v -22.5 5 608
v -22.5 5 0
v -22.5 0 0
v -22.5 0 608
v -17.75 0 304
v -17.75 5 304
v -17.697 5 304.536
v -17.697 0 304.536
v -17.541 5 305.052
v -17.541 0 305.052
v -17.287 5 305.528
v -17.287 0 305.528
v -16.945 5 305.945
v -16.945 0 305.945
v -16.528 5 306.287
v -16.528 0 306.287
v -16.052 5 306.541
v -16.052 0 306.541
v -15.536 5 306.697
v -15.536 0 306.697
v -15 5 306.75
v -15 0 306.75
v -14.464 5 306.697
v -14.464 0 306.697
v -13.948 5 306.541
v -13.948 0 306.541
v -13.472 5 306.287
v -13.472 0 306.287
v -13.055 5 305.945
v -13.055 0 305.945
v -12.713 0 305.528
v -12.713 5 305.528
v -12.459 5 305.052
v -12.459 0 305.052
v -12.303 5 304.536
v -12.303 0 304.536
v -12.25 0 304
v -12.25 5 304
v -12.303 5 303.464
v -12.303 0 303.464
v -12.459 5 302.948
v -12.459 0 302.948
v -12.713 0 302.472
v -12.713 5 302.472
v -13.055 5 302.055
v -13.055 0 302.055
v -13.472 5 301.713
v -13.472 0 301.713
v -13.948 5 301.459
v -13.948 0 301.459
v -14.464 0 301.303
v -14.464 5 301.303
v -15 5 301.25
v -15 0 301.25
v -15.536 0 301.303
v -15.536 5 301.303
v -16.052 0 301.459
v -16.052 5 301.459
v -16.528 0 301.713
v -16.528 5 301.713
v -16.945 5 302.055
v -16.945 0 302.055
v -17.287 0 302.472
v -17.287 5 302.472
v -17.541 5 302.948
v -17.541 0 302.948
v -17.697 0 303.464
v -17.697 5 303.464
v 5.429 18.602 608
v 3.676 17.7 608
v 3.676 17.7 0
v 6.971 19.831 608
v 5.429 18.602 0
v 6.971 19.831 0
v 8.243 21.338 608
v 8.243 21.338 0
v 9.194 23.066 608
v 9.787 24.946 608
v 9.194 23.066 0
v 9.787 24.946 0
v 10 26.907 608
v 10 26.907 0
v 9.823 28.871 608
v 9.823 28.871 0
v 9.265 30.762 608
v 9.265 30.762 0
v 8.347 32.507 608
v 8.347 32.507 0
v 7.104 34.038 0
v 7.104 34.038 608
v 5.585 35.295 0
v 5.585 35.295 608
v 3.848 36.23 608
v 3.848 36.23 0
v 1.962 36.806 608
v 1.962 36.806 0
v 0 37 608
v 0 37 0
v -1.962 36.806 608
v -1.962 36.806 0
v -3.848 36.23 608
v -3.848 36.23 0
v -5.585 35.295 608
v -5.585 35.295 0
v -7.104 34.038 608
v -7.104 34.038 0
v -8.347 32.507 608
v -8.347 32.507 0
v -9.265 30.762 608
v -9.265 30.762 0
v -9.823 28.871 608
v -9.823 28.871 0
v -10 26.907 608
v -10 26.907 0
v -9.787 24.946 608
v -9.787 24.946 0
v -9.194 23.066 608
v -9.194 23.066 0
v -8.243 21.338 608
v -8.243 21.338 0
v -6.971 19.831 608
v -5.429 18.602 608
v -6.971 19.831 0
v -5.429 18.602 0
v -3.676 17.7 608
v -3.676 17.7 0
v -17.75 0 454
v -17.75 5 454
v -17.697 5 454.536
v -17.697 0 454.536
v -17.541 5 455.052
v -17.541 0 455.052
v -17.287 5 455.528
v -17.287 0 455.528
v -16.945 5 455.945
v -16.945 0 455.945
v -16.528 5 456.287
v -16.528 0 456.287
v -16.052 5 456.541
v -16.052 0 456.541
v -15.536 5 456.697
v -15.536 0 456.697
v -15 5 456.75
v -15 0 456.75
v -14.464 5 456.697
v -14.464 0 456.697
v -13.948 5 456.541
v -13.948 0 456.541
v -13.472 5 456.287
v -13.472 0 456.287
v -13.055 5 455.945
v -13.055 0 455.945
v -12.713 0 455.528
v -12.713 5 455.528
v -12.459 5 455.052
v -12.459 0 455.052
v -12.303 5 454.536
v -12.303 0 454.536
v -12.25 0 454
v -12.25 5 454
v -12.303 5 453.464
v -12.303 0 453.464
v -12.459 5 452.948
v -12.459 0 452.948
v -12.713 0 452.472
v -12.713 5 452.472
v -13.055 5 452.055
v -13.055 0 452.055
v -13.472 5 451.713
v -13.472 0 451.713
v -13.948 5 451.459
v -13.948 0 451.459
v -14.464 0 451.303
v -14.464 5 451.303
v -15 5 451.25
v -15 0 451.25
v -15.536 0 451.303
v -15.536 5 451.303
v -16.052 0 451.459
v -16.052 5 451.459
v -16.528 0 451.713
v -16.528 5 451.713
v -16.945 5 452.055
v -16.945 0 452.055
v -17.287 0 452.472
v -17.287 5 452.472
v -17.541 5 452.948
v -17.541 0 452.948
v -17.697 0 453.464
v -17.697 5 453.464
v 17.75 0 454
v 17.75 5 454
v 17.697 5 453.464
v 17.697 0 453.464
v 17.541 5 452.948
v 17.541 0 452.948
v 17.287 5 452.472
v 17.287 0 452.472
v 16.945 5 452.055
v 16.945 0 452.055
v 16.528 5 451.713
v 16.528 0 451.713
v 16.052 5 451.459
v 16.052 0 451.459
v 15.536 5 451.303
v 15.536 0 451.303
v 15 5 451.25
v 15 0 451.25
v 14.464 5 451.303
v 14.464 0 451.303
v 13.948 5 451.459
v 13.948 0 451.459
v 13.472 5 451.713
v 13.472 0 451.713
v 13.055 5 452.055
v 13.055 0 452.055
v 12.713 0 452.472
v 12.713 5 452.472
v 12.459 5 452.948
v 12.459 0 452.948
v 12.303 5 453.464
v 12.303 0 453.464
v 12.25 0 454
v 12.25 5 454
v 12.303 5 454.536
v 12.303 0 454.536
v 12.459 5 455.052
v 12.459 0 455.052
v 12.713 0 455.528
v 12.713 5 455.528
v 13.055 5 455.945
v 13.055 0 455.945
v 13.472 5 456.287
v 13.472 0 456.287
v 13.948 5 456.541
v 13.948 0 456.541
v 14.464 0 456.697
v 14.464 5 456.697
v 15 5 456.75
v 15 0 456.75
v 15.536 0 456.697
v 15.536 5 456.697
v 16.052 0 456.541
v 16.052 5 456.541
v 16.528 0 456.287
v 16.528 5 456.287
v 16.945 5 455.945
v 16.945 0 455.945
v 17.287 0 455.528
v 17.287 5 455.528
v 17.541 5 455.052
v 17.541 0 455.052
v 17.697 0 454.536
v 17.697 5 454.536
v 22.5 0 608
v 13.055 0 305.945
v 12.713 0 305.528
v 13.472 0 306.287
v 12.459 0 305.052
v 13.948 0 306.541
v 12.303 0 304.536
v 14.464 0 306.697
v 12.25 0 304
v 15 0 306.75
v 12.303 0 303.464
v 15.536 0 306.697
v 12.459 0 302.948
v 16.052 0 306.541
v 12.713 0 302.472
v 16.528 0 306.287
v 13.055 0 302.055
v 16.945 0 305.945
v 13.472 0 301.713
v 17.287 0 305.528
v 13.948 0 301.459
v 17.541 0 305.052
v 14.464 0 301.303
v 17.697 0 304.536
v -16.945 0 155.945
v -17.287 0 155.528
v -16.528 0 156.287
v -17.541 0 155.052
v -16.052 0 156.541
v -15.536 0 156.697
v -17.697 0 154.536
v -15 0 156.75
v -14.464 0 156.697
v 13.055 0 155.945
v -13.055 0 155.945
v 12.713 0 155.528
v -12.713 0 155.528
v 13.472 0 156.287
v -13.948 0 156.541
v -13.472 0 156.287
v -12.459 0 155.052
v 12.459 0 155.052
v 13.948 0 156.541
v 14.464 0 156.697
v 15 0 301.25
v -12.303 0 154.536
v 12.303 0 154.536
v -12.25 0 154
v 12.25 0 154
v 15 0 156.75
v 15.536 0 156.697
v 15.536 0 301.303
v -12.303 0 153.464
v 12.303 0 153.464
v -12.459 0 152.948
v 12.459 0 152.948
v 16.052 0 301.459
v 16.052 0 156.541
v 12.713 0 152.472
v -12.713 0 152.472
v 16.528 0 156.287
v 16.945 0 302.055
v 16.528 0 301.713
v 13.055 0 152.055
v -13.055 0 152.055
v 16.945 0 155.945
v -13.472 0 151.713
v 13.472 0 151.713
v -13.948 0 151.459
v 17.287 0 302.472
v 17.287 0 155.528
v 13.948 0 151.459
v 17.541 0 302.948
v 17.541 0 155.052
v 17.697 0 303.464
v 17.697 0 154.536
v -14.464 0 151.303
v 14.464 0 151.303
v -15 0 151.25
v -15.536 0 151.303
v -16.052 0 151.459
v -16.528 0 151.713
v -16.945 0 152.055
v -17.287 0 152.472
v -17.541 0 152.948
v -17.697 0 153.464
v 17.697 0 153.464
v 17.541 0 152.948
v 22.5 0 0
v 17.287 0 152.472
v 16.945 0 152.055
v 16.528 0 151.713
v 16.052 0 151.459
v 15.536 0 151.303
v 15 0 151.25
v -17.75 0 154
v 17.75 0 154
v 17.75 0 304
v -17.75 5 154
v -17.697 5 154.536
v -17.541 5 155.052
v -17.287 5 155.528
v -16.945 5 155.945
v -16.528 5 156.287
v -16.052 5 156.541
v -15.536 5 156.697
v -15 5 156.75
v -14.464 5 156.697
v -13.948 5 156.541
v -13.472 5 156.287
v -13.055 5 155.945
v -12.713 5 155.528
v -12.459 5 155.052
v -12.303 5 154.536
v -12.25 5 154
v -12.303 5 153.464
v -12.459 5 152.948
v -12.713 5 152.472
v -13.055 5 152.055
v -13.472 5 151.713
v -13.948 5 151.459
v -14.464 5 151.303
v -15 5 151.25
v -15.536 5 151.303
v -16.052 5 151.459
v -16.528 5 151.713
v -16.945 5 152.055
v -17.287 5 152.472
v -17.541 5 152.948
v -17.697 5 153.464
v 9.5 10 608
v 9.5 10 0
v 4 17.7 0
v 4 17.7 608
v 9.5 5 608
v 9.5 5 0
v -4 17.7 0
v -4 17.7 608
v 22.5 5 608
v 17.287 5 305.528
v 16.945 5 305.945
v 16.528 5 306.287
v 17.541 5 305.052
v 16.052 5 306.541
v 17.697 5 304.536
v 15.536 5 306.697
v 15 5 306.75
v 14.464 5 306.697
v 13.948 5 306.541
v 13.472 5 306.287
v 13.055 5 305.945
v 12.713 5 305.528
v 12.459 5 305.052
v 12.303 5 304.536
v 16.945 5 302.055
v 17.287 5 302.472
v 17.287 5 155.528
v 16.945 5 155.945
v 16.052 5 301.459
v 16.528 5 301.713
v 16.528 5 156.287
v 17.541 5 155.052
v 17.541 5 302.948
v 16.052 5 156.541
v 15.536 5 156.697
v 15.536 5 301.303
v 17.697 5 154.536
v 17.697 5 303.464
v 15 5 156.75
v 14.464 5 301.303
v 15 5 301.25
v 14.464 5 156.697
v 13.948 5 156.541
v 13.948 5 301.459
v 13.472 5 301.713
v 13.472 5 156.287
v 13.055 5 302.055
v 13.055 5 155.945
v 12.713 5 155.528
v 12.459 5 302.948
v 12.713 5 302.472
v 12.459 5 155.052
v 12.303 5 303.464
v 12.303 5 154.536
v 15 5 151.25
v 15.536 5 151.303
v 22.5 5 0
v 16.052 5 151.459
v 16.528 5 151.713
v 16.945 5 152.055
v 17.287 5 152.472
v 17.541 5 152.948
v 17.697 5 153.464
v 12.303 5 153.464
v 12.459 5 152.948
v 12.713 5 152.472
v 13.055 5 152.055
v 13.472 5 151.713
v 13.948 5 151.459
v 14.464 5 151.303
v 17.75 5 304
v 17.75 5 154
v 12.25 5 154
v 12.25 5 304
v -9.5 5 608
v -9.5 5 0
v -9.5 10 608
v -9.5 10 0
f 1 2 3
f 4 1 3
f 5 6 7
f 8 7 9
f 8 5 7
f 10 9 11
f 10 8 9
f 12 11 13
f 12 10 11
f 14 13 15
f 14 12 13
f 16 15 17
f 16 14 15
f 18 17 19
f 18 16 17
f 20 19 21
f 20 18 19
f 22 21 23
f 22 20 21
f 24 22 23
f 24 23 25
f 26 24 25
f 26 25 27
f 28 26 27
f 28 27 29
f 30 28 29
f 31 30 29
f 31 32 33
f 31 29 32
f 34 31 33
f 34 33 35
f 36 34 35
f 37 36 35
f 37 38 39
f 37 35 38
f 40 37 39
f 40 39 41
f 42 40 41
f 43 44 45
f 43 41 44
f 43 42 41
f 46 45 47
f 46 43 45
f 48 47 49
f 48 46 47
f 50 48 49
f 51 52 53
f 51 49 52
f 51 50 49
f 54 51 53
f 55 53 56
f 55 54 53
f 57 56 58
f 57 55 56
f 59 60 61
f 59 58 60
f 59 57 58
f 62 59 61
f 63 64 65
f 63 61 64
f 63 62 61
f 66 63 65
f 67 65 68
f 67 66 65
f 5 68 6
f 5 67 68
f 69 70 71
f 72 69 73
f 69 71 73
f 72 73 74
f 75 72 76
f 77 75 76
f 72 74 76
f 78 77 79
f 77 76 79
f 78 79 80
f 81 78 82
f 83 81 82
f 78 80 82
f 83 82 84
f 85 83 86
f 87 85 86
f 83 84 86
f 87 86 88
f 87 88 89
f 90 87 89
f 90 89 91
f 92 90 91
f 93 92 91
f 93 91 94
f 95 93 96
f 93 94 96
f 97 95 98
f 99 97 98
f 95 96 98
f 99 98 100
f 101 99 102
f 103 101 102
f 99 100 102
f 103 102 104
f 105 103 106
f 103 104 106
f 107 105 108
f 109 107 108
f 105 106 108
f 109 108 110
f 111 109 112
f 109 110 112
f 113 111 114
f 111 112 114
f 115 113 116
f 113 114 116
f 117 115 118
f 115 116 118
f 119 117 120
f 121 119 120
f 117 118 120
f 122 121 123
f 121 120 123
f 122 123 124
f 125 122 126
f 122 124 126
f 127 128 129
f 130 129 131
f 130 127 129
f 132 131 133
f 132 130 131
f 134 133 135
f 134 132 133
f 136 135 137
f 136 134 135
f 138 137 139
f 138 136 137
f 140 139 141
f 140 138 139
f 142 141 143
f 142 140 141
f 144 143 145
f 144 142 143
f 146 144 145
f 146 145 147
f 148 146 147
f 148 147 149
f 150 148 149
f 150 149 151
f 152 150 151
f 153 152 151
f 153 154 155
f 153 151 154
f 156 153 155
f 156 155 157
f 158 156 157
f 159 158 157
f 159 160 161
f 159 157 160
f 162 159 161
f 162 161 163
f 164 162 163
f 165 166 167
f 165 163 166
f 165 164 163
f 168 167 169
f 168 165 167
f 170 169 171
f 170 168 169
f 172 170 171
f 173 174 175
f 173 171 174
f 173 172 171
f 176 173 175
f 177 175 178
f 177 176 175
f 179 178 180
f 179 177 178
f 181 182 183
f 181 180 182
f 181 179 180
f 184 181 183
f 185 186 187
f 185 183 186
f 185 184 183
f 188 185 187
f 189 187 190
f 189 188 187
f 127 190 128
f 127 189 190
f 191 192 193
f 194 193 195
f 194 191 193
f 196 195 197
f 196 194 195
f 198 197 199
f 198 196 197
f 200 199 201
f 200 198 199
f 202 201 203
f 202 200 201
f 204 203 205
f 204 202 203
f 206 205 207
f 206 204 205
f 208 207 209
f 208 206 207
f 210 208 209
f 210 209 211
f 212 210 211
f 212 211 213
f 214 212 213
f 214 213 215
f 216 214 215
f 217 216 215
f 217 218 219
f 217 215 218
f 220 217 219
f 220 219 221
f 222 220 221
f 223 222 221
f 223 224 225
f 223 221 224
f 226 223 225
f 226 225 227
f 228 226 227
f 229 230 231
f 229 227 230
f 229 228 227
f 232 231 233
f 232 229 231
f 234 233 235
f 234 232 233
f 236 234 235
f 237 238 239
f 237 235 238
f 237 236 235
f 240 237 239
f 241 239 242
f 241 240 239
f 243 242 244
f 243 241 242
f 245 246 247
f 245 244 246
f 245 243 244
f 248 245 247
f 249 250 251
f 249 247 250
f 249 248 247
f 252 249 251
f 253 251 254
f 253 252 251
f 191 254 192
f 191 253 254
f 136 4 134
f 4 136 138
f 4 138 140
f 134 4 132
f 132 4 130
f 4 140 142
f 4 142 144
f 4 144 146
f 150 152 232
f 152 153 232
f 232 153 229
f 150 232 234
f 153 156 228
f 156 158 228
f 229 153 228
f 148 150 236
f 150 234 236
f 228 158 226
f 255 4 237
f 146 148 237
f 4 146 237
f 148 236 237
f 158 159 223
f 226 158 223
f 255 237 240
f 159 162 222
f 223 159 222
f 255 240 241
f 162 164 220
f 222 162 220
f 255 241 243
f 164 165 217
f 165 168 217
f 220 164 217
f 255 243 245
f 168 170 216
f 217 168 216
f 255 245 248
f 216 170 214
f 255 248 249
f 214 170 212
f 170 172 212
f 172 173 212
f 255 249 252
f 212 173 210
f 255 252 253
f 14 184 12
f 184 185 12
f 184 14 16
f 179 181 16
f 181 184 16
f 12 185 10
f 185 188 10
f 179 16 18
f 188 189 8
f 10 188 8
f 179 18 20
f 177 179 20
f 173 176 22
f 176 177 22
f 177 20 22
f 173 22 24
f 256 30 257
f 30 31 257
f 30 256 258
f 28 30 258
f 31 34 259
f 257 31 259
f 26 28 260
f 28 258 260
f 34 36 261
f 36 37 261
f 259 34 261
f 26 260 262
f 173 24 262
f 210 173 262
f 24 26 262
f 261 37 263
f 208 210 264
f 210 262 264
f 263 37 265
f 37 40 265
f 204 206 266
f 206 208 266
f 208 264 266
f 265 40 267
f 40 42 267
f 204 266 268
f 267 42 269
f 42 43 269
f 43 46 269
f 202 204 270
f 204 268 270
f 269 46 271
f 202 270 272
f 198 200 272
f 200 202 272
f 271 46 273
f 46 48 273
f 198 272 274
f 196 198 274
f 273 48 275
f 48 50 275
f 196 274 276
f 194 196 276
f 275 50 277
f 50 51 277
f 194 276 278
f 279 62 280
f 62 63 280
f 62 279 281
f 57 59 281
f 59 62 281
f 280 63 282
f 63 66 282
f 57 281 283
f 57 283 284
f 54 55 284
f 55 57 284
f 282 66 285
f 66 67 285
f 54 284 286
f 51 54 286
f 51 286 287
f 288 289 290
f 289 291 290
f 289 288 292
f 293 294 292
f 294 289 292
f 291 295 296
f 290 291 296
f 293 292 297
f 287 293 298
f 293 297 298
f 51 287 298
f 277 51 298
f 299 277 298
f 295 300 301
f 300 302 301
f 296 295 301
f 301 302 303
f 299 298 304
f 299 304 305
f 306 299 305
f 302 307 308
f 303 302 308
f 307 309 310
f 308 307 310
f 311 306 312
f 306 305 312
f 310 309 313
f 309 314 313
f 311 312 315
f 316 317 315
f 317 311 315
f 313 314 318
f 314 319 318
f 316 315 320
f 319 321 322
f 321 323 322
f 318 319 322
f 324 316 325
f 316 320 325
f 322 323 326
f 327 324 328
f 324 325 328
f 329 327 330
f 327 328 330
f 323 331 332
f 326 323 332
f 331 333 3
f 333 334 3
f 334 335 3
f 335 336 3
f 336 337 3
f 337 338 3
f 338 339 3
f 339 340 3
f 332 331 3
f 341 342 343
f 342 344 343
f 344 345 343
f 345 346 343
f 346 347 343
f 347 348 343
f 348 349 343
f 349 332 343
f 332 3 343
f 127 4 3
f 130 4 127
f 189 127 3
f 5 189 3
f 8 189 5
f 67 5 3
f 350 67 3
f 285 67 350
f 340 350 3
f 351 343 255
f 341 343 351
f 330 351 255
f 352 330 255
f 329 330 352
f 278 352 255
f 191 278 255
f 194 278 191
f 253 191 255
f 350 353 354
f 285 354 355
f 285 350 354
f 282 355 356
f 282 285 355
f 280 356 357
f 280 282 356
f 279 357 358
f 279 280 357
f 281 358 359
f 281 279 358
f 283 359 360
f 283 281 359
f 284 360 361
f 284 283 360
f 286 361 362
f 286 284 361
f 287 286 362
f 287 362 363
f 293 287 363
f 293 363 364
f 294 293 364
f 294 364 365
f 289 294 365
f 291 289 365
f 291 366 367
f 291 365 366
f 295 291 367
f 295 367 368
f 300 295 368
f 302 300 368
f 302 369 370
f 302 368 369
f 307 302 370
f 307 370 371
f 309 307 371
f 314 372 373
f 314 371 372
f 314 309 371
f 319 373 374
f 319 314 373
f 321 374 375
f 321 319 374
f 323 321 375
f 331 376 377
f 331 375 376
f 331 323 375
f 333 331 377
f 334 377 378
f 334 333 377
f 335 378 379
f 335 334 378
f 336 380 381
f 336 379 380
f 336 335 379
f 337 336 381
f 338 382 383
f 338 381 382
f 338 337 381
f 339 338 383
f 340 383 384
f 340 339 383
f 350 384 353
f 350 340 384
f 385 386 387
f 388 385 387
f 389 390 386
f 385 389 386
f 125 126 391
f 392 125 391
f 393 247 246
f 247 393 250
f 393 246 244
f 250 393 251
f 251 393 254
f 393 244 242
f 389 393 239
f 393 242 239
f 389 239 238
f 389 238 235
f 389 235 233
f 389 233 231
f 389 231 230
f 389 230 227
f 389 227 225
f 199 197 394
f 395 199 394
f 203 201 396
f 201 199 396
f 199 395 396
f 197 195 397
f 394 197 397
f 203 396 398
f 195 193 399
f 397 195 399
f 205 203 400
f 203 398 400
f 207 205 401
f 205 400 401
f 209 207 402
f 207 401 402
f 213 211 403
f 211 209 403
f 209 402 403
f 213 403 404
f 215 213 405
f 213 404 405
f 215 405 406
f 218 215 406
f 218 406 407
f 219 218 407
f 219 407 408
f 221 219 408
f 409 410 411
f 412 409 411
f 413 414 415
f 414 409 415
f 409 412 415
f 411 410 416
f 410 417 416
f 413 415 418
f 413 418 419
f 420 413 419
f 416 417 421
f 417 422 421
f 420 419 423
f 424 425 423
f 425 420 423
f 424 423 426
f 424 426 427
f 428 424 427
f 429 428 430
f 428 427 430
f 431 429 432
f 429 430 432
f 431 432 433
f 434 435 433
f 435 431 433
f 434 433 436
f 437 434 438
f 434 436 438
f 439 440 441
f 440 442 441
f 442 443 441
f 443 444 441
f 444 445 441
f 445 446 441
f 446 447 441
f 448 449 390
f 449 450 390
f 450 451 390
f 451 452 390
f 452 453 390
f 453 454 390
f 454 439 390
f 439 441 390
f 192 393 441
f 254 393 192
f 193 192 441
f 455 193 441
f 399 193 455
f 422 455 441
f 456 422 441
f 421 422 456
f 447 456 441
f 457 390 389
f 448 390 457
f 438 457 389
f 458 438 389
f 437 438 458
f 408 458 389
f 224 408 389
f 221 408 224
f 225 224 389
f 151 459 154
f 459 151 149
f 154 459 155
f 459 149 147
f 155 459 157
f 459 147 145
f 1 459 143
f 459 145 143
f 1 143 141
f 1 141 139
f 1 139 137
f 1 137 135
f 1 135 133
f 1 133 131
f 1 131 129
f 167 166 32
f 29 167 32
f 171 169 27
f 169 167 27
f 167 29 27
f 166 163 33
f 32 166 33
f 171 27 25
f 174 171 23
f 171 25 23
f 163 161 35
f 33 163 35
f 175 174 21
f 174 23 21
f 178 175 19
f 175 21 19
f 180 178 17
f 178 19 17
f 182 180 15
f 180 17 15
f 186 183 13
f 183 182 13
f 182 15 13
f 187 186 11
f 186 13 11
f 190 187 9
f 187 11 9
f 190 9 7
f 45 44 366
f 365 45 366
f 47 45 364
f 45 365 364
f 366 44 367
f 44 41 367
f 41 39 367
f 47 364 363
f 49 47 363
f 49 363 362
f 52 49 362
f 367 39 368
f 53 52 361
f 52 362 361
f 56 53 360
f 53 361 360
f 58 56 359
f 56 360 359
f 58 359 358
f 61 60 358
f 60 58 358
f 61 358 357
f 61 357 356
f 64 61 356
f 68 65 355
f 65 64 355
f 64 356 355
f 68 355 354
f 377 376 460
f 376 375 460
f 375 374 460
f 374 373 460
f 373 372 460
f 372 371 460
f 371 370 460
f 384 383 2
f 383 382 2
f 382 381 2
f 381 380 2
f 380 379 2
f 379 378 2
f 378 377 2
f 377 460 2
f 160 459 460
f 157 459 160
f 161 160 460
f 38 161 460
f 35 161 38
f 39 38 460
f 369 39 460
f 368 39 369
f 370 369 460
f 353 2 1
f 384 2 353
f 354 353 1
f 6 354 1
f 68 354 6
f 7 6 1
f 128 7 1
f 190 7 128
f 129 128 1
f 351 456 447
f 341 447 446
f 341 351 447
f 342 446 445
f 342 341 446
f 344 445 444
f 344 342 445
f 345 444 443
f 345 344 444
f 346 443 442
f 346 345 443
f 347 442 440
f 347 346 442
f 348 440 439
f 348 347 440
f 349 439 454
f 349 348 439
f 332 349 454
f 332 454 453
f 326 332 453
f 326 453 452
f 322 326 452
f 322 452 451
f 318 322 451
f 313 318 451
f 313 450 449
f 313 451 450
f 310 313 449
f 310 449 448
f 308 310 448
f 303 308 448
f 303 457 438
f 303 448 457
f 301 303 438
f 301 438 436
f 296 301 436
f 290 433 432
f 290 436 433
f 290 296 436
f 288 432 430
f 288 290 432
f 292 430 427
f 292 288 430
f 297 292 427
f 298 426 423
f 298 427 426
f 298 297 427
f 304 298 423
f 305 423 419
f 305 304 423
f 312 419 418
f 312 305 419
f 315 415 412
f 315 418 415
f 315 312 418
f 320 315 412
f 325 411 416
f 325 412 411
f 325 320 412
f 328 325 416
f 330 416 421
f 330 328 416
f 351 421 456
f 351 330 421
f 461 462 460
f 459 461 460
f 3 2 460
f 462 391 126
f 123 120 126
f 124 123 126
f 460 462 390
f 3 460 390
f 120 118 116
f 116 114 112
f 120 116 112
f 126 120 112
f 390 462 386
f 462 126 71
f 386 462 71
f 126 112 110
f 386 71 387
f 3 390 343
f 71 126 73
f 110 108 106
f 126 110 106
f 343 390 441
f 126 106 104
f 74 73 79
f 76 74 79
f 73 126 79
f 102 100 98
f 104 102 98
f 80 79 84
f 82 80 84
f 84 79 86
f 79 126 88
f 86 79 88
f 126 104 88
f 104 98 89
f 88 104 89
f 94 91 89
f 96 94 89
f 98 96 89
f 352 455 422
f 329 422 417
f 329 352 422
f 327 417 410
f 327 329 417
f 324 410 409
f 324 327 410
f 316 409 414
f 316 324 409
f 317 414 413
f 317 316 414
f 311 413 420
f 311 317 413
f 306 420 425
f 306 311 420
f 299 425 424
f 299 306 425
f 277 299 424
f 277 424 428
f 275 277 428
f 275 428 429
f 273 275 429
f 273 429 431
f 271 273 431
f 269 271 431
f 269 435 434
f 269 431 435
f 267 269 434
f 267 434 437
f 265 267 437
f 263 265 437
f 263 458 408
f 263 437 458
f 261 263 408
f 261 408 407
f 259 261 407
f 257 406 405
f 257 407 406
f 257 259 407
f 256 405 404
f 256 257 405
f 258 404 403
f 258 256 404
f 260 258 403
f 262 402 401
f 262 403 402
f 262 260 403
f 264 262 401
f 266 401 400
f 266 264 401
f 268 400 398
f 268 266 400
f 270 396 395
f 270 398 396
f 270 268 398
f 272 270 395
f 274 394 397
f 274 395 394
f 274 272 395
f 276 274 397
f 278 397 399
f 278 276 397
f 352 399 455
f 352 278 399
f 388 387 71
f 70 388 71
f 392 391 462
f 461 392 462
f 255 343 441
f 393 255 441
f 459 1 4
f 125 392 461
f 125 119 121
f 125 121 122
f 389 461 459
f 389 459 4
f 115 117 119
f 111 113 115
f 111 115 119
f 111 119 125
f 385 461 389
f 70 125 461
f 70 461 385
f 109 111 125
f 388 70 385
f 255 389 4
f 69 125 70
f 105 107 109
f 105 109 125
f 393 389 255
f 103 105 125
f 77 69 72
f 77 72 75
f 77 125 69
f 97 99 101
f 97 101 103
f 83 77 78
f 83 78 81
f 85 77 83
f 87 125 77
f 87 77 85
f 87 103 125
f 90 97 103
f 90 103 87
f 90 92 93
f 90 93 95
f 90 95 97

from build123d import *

# Parameters (mm, degrees)
SKETCH_1_R          = 10
EXTRUDE_1_DEPTH     = 608
SKETCH_2_R          = 2.75
CUT_EXTRUDE_2_DEPTH = 450


with BuildPart() as part:
    # 草图1 → 凸台-拉伸1 (new body)
    with BuildSketch(Plane.XY):
        with Locations((0, 27)):
            Circle(SKETCH_1_R)
        with BuildLine():
            Line((-22.5, 5), (-22.5, 0))
            Line((-22.5, 0), (0, 0))
            Line((0, 0), (0, 17))
            ThreePointArc((0, 17), (-1.870828693, 17.176558648), (-3.67559519, 17.7))
            Line((-3.67559519, 17.7), (-4, 17.7))
            Line((-4, 17.7), (-9.5, 10))
            Line((-9.5, 10), (-9.5, 5))
            Line((-9.5, 5), (-22.5, 5))
        make_face()
        with BuildLine():
            Line((0, 17), (0, 0))
            Line((0, 0), (22.5, 0))
            Line((22.5, 0), (22.5, 5))
            Line((22.5, 5), (9.5, 5))
            Line((9.5, 5), (9.5, 10))
            Line((9.5, 10), (4, 17.7))
            Line((4, 17.7), (3.67559519, 17.7))
            ThreePointArc((3.67559519, 17.7), (1.870828693, 17.176558648), (0, 17))
        make_face()
    extrude(amount=EXTRUDE_1_DEPTH)

    # 草图2 → 切除-拉伸2 (cut)
    with BuildSketch(Plane(origin=(0, 0, 0), x_dir=(1, 0, 0), z_dir=(0, 1, 0))):
        with Locations((15, -304)):
            Circle(SKETCH_2_R)
        with Locations((15, -454)):
            Circle(SKETCH_2_R)
        with Locations(Location((-15, -304, 0), (0, 0, 180))):
            Circle(SKETCH_2_R)
        with Locations(Location((-15, -454, 0), (0, 0, 180))):
            Circle(SKETCH_2_R)
        with Locations((15, -154)):
            Circle(SKETCH_2_R)
        with Locations(Location((-15, -154, 0), (0, 0, 180))):
            Circle(SKETCH_2_R)
    extrude(amount=CUT_EXTRUDE_2_DEPTH, mode=Mode.SUBTRACT)


solid = part.part
